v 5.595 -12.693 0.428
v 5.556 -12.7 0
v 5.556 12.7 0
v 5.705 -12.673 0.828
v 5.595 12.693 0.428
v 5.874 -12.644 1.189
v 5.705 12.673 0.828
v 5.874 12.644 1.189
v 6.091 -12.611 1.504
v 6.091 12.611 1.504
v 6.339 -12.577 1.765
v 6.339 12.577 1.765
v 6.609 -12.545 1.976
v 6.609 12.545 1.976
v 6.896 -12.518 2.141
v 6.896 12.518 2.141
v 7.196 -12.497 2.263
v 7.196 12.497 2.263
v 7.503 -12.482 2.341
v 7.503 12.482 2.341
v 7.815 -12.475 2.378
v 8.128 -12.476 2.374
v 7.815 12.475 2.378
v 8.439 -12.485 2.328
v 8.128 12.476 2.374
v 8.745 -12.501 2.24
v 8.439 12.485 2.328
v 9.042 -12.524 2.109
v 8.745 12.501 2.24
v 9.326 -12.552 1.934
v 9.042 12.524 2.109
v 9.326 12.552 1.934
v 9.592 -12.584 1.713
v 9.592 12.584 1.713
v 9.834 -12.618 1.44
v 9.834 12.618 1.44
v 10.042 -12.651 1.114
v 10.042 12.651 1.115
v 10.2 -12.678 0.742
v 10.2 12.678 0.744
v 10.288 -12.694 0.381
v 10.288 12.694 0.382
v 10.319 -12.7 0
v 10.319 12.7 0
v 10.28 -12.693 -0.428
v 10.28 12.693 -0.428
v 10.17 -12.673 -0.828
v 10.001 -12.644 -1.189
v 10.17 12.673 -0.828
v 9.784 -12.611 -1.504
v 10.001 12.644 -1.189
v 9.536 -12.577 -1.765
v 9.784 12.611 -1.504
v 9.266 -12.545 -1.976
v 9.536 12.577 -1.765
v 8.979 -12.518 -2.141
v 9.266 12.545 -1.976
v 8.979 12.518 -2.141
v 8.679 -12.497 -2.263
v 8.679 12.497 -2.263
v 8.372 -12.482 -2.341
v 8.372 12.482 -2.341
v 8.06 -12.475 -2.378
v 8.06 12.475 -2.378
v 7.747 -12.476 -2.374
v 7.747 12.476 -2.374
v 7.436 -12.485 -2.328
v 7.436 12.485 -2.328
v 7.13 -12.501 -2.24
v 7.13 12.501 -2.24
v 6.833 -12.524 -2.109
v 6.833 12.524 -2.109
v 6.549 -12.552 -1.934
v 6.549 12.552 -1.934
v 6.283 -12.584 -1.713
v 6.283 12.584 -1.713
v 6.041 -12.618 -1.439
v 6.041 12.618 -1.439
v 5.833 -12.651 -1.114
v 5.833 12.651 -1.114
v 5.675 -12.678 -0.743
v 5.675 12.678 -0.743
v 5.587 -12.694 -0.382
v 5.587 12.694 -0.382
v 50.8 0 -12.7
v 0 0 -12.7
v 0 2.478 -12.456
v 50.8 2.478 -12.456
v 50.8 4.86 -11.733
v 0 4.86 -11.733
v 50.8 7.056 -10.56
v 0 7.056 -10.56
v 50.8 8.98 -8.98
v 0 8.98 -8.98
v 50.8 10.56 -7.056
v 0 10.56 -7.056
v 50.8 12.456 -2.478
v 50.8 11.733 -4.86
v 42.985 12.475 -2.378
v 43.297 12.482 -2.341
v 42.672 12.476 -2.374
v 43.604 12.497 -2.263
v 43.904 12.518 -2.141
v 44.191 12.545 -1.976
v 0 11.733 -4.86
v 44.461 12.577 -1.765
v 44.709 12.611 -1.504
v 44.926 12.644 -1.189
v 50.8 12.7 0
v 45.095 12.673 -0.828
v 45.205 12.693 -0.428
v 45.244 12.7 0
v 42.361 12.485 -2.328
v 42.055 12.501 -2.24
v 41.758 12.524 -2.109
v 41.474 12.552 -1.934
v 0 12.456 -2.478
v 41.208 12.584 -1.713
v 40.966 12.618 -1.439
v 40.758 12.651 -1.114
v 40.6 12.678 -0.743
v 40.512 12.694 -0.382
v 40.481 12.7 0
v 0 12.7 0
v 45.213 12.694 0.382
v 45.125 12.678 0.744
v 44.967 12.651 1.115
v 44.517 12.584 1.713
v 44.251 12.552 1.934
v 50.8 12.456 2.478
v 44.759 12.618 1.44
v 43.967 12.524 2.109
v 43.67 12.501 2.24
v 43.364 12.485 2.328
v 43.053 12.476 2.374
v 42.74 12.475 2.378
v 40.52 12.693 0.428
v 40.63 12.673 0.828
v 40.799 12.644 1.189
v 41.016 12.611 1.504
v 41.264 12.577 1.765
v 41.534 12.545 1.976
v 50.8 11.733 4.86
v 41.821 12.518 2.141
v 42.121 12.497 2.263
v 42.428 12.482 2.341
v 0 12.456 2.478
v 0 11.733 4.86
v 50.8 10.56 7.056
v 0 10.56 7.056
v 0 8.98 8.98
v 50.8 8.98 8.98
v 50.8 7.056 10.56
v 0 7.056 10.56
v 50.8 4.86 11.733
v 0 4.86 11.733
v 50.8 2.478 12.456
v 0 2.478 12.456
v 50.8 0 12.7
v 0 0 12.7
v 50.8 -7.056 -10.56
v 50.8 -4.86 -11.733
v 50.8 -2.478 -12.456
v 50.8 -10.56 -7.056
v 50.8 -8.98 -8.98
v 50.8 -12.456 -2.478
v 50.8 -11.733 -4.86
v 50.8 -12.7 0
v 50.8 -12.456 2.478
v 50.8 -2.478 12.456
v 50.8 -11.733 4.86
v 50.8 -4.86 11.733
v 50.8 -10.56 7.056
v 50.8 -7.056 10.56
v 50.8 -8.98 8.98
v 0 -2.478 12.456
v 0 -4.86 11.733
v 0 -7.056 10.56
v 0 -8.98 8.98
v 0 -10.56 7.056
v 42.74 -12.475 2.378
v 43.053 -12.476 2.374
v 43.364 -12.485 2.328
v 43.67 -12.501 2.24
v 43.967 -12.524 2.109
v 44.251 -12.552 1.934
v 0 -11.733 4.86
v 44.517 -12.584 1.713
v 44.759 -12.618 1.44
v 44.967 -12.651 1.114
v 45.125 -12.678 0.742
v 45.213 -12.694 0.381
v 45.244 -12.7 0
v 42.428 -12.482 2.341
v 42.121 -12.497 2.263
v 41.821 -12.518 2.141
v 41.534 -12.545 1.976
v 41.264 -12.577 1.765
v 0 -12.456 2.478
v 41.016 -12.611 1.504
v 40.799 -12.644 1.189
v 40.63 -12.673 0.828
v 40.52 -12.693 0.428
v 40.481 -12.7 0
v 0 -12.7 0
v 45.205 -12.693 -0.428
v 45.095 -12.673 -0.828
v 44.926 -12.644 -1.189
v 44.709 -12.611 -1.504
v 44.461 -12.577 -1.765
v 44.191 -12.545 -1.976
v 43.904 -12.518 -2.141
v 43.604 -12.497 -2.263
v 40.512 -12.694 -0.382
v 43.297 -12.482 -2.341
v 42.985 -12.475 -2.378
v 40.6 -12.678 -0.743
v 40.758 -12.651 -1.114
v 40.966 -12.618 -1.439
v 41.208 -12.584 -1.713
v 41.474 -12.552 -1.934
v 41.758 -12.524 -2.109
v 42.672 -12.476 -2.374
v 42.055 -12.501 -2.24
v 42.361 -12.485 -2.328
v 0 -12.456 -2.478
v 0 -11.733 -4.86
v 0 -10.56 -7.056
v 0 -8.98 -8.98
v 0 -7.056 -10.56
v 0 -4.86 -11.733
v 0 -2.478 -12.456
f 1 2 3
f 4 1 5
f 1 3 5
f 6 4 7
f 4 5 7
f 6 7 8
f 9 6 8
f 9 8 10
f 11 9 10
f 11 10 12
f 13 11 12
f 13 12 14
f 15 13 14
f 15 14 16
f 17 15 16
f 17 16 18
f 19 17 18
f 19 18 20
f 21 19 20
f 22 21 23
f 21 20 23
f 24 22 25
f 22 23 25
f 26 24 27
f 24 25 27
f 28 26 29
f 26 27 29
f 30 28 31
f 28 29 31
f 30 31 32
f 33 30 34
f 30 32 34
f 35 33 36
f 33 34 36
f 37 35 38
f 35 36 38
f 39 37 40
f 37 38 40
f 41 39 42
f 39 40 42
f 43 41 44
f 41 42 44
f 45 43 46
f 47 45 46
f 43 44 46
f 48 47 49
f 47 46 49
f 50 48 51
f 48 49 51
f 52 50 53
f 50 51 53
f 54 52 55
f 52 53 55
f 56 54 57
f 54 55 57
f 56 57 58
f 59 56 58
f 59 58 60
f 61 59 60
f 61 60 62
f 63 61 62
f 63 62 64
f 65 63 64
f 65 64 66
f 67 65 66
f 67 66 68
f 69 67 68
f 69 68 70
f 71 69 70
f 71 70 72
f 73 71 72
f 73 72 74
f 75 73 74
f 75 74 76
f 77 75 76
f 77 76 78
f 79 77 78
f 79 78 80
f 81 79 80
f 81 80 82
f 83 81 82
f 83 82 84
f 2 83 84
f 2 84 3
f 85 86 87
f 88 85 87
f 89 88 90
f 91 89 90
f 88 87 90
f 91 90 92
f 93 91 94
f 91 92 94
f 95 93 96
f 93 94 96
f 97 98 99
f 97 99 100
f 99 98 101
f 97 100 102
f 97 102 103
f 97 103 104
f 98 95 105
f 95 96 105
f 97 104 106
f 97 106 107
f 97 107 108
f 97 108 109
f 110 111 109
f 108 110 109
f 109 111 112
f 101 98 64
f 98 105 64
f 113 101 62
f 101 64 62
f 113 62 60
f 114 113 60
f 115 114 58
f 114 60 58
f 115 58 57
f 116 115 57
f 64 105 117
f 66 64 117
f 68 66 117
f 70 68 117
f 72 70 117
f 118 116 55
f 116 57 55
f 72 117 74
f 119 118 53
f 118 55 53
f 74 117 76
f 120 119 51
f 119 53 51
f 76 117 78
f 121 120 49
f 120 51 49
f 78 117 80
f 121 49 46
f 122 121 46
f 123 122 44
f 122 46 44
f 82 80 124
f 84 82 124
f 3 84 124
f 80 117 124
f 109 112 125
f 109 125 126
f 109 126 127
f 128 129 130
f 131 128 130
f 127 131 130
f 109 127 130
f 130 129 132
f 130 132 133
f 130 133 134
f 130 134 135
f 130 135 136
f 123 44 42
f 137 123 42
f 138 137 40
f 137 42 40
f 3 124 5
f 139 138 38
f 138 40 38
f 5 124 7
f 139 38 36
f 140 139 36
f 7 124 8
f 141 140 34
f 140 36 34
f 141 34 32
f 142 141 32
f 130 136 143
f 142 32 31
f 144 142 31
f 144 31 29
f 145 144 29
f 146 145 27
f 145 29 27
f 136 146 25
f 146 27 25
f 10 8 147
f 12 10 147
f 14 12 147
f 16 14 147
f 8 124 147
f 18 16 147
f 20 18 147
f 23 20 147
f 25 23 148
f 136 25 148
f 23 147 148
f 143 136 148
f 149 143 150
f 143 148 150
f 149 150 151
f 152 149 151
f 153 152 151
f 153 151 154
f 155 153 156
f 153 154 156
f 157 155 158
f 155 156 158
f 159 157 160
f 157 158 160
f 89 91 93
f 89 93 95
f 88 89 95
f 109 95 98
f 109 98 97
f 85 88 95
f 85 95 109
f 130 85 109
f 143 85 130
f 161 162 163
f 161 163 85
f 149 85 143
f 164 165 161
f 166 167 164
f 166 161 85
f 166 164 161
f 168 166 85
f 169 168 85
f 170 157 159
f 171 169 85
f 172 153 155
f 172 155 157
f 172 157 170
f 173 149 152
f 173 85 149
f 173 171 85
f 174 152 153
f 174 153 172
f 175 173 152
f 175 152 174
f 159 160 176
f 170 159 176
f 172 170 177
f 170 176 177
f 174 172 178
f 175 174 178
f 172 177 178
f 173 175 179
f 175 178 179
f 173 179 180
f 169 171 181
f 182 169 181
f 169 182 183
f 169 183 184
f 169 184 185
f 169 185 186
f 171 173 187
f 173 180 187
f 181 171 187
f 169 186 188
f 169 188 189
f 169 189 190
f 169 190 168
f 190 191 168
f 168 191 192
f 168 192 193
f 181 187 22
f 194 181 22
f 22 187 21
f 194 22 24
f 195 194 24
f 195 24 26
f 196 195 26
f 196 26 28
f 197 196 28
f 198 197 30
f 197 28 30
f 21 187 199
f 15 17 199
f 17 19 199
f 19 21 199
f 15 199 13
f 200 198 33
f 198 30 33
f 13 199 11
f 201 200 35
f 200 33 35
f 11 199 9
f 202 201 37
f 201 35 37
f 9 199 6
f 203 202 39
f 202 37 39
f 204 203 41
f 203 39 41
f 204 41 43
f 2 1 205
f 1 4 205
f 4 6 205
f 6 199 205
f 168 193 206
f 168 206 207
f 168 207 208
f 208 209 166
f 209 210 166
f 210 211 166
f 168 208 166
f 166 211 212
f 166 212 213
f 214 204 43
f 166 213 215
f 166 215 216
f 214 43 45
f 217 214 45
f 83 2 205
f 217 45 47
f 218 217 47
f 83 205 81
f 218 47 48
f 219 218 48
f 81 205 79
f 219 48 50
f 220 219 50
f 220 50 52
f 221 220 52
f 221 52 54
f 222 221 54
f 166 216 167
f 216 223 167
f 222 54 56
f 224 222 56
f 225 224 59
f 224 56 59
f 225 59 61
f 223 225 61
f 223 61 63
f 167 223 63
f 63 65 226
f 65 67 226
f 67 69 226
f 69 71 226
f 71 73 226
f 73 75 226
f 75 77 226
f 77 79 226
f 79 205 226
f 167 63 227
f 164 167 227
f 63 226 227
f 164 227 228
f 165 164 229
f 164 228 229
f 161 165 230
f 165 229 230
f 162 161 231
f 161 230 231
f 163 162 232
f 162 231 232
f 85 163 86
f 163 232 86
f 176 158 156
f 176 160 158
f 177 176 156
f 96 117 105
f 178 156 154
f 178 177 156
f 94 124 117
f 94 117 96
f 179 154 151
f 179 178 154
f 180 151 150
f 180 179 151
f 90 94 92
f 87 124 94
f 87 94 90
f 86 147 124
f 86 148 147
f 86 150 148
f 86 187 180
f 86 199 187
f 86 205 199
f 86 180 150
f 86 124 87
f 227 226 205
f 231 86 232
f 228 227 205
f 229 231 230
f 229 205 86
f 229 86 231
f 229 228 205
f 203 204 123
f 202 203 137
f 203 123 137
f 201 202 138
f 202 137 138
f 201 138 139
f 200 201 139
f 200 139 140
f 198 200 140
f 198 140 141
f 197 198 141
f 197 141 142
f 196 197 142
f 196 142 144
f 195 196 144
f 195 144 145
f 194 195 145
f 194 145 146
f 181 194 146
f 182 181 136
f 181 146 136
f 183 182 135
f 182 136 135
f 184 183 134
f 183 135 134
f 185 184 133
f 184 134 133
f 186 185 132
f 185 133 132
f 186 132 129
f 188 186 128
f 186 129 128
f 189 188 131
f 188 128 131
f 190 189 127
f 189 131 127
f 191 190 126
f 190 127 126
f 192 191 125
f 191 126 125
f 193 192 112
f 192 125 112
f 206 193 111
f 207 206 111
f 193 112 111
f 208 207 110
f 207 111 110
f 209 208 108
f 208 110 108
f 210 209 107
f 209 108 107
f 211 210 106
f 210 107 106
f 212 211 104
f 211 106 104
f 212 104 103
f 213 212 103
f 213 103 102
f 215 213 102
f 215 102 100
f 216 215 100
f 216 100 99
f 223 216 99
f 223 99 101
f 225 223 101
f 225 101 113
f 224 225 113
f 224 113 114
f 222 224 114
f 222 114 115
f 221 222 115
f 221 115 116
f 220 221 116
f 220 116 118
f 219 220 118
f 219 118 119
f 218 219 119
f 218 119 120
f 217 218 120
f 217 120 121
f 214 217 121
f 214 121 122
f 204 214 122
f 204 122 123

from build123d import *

# Parameters (mm, degrees)
F0_W     = 7.9375
F0_H     = 12.7
F0_W_2   = 34.925
F1_DEPTH = 12.7
F3_D     = 4.7625
F5_DEPTH = 50.8


with BuildPart() as f1:
    # F0 (on Front) → F1 (new body, symmetric)
    with BuildSketch(Plane.XZ):
        with Locations((3.96875, -6.35)):
            Rectangle(F0_W, F0_H)
        with Locations((25.4, -6.35)):
            Rectangle(F0_W_2, F0_H)
        with Locations((46.83125, -6.35)):
            Rectangle(F0_W, F0_H)
        with Locations((3.96875, 6.35)):
            Rectangle(F0_W, F0_H)
        with Locations((25.4, 6.35)):
            Rectangle(F0_W_2, F0_H)
        with Locations((46.83125, 6.35)):
            Rectangle(F0_W, F0_H)
    extrude(amount=F1_DEPTH, both=True)

    # F3 (through all)
    with Locations(Plane.XZ.offset(12.7)):
        with Locations((7.9375, 0), (42.8625, 0)):
            Hole(F3_D / 2)

    # F4 (on face) → F5 (cut)
    with BuildSketch(Plane(origin=(0, 0, 0), x_dir=(0, -1, 0), z_dir=(-1, 0, 0))):
        with BuildLine():
            Line((12.7, -12.7), (12.7, 0))
            ThreePointArc((12.7, 0), (8.9802561211, -8.9802561211), (0, -12.7))
            Line((0, -12.7), (12.7, -12.7))
        make_face()
        with BuildLine():
            Line((-12.7, -12.7), (0, -12.7))
            ThreePointArc((0, -12.7), (-8.9802561211, -8.9802561211), (-12.7, 0))
            Line((-12.7, 0), (-12.7, -12.7))
        make_face()
        with BuildLine():
            ThreePointArc((-12.7, 0), (-8.9802561145, 8.9802561276), (1.86e-08, 12.7))
            Line((1.86e-08, 12.7), (-12.7, 12.7))
            Line((-12.7, 12.7), (-12.7, 0))
        make_face()
        with BuildLine():
            ThreePointArc((1.86e-08, 12.7), (8.9802561276, 8.9802561145), (12.7, 0))
            Line((12.7, 0), (12.7, 12.7))
            Line((12.7, 12.7), (1.86e-08, 12.7))
        make_face()
    extrude(amount=-F5_DEPTH, mode=Mode.SUBTRACT)


solid = f1.part
